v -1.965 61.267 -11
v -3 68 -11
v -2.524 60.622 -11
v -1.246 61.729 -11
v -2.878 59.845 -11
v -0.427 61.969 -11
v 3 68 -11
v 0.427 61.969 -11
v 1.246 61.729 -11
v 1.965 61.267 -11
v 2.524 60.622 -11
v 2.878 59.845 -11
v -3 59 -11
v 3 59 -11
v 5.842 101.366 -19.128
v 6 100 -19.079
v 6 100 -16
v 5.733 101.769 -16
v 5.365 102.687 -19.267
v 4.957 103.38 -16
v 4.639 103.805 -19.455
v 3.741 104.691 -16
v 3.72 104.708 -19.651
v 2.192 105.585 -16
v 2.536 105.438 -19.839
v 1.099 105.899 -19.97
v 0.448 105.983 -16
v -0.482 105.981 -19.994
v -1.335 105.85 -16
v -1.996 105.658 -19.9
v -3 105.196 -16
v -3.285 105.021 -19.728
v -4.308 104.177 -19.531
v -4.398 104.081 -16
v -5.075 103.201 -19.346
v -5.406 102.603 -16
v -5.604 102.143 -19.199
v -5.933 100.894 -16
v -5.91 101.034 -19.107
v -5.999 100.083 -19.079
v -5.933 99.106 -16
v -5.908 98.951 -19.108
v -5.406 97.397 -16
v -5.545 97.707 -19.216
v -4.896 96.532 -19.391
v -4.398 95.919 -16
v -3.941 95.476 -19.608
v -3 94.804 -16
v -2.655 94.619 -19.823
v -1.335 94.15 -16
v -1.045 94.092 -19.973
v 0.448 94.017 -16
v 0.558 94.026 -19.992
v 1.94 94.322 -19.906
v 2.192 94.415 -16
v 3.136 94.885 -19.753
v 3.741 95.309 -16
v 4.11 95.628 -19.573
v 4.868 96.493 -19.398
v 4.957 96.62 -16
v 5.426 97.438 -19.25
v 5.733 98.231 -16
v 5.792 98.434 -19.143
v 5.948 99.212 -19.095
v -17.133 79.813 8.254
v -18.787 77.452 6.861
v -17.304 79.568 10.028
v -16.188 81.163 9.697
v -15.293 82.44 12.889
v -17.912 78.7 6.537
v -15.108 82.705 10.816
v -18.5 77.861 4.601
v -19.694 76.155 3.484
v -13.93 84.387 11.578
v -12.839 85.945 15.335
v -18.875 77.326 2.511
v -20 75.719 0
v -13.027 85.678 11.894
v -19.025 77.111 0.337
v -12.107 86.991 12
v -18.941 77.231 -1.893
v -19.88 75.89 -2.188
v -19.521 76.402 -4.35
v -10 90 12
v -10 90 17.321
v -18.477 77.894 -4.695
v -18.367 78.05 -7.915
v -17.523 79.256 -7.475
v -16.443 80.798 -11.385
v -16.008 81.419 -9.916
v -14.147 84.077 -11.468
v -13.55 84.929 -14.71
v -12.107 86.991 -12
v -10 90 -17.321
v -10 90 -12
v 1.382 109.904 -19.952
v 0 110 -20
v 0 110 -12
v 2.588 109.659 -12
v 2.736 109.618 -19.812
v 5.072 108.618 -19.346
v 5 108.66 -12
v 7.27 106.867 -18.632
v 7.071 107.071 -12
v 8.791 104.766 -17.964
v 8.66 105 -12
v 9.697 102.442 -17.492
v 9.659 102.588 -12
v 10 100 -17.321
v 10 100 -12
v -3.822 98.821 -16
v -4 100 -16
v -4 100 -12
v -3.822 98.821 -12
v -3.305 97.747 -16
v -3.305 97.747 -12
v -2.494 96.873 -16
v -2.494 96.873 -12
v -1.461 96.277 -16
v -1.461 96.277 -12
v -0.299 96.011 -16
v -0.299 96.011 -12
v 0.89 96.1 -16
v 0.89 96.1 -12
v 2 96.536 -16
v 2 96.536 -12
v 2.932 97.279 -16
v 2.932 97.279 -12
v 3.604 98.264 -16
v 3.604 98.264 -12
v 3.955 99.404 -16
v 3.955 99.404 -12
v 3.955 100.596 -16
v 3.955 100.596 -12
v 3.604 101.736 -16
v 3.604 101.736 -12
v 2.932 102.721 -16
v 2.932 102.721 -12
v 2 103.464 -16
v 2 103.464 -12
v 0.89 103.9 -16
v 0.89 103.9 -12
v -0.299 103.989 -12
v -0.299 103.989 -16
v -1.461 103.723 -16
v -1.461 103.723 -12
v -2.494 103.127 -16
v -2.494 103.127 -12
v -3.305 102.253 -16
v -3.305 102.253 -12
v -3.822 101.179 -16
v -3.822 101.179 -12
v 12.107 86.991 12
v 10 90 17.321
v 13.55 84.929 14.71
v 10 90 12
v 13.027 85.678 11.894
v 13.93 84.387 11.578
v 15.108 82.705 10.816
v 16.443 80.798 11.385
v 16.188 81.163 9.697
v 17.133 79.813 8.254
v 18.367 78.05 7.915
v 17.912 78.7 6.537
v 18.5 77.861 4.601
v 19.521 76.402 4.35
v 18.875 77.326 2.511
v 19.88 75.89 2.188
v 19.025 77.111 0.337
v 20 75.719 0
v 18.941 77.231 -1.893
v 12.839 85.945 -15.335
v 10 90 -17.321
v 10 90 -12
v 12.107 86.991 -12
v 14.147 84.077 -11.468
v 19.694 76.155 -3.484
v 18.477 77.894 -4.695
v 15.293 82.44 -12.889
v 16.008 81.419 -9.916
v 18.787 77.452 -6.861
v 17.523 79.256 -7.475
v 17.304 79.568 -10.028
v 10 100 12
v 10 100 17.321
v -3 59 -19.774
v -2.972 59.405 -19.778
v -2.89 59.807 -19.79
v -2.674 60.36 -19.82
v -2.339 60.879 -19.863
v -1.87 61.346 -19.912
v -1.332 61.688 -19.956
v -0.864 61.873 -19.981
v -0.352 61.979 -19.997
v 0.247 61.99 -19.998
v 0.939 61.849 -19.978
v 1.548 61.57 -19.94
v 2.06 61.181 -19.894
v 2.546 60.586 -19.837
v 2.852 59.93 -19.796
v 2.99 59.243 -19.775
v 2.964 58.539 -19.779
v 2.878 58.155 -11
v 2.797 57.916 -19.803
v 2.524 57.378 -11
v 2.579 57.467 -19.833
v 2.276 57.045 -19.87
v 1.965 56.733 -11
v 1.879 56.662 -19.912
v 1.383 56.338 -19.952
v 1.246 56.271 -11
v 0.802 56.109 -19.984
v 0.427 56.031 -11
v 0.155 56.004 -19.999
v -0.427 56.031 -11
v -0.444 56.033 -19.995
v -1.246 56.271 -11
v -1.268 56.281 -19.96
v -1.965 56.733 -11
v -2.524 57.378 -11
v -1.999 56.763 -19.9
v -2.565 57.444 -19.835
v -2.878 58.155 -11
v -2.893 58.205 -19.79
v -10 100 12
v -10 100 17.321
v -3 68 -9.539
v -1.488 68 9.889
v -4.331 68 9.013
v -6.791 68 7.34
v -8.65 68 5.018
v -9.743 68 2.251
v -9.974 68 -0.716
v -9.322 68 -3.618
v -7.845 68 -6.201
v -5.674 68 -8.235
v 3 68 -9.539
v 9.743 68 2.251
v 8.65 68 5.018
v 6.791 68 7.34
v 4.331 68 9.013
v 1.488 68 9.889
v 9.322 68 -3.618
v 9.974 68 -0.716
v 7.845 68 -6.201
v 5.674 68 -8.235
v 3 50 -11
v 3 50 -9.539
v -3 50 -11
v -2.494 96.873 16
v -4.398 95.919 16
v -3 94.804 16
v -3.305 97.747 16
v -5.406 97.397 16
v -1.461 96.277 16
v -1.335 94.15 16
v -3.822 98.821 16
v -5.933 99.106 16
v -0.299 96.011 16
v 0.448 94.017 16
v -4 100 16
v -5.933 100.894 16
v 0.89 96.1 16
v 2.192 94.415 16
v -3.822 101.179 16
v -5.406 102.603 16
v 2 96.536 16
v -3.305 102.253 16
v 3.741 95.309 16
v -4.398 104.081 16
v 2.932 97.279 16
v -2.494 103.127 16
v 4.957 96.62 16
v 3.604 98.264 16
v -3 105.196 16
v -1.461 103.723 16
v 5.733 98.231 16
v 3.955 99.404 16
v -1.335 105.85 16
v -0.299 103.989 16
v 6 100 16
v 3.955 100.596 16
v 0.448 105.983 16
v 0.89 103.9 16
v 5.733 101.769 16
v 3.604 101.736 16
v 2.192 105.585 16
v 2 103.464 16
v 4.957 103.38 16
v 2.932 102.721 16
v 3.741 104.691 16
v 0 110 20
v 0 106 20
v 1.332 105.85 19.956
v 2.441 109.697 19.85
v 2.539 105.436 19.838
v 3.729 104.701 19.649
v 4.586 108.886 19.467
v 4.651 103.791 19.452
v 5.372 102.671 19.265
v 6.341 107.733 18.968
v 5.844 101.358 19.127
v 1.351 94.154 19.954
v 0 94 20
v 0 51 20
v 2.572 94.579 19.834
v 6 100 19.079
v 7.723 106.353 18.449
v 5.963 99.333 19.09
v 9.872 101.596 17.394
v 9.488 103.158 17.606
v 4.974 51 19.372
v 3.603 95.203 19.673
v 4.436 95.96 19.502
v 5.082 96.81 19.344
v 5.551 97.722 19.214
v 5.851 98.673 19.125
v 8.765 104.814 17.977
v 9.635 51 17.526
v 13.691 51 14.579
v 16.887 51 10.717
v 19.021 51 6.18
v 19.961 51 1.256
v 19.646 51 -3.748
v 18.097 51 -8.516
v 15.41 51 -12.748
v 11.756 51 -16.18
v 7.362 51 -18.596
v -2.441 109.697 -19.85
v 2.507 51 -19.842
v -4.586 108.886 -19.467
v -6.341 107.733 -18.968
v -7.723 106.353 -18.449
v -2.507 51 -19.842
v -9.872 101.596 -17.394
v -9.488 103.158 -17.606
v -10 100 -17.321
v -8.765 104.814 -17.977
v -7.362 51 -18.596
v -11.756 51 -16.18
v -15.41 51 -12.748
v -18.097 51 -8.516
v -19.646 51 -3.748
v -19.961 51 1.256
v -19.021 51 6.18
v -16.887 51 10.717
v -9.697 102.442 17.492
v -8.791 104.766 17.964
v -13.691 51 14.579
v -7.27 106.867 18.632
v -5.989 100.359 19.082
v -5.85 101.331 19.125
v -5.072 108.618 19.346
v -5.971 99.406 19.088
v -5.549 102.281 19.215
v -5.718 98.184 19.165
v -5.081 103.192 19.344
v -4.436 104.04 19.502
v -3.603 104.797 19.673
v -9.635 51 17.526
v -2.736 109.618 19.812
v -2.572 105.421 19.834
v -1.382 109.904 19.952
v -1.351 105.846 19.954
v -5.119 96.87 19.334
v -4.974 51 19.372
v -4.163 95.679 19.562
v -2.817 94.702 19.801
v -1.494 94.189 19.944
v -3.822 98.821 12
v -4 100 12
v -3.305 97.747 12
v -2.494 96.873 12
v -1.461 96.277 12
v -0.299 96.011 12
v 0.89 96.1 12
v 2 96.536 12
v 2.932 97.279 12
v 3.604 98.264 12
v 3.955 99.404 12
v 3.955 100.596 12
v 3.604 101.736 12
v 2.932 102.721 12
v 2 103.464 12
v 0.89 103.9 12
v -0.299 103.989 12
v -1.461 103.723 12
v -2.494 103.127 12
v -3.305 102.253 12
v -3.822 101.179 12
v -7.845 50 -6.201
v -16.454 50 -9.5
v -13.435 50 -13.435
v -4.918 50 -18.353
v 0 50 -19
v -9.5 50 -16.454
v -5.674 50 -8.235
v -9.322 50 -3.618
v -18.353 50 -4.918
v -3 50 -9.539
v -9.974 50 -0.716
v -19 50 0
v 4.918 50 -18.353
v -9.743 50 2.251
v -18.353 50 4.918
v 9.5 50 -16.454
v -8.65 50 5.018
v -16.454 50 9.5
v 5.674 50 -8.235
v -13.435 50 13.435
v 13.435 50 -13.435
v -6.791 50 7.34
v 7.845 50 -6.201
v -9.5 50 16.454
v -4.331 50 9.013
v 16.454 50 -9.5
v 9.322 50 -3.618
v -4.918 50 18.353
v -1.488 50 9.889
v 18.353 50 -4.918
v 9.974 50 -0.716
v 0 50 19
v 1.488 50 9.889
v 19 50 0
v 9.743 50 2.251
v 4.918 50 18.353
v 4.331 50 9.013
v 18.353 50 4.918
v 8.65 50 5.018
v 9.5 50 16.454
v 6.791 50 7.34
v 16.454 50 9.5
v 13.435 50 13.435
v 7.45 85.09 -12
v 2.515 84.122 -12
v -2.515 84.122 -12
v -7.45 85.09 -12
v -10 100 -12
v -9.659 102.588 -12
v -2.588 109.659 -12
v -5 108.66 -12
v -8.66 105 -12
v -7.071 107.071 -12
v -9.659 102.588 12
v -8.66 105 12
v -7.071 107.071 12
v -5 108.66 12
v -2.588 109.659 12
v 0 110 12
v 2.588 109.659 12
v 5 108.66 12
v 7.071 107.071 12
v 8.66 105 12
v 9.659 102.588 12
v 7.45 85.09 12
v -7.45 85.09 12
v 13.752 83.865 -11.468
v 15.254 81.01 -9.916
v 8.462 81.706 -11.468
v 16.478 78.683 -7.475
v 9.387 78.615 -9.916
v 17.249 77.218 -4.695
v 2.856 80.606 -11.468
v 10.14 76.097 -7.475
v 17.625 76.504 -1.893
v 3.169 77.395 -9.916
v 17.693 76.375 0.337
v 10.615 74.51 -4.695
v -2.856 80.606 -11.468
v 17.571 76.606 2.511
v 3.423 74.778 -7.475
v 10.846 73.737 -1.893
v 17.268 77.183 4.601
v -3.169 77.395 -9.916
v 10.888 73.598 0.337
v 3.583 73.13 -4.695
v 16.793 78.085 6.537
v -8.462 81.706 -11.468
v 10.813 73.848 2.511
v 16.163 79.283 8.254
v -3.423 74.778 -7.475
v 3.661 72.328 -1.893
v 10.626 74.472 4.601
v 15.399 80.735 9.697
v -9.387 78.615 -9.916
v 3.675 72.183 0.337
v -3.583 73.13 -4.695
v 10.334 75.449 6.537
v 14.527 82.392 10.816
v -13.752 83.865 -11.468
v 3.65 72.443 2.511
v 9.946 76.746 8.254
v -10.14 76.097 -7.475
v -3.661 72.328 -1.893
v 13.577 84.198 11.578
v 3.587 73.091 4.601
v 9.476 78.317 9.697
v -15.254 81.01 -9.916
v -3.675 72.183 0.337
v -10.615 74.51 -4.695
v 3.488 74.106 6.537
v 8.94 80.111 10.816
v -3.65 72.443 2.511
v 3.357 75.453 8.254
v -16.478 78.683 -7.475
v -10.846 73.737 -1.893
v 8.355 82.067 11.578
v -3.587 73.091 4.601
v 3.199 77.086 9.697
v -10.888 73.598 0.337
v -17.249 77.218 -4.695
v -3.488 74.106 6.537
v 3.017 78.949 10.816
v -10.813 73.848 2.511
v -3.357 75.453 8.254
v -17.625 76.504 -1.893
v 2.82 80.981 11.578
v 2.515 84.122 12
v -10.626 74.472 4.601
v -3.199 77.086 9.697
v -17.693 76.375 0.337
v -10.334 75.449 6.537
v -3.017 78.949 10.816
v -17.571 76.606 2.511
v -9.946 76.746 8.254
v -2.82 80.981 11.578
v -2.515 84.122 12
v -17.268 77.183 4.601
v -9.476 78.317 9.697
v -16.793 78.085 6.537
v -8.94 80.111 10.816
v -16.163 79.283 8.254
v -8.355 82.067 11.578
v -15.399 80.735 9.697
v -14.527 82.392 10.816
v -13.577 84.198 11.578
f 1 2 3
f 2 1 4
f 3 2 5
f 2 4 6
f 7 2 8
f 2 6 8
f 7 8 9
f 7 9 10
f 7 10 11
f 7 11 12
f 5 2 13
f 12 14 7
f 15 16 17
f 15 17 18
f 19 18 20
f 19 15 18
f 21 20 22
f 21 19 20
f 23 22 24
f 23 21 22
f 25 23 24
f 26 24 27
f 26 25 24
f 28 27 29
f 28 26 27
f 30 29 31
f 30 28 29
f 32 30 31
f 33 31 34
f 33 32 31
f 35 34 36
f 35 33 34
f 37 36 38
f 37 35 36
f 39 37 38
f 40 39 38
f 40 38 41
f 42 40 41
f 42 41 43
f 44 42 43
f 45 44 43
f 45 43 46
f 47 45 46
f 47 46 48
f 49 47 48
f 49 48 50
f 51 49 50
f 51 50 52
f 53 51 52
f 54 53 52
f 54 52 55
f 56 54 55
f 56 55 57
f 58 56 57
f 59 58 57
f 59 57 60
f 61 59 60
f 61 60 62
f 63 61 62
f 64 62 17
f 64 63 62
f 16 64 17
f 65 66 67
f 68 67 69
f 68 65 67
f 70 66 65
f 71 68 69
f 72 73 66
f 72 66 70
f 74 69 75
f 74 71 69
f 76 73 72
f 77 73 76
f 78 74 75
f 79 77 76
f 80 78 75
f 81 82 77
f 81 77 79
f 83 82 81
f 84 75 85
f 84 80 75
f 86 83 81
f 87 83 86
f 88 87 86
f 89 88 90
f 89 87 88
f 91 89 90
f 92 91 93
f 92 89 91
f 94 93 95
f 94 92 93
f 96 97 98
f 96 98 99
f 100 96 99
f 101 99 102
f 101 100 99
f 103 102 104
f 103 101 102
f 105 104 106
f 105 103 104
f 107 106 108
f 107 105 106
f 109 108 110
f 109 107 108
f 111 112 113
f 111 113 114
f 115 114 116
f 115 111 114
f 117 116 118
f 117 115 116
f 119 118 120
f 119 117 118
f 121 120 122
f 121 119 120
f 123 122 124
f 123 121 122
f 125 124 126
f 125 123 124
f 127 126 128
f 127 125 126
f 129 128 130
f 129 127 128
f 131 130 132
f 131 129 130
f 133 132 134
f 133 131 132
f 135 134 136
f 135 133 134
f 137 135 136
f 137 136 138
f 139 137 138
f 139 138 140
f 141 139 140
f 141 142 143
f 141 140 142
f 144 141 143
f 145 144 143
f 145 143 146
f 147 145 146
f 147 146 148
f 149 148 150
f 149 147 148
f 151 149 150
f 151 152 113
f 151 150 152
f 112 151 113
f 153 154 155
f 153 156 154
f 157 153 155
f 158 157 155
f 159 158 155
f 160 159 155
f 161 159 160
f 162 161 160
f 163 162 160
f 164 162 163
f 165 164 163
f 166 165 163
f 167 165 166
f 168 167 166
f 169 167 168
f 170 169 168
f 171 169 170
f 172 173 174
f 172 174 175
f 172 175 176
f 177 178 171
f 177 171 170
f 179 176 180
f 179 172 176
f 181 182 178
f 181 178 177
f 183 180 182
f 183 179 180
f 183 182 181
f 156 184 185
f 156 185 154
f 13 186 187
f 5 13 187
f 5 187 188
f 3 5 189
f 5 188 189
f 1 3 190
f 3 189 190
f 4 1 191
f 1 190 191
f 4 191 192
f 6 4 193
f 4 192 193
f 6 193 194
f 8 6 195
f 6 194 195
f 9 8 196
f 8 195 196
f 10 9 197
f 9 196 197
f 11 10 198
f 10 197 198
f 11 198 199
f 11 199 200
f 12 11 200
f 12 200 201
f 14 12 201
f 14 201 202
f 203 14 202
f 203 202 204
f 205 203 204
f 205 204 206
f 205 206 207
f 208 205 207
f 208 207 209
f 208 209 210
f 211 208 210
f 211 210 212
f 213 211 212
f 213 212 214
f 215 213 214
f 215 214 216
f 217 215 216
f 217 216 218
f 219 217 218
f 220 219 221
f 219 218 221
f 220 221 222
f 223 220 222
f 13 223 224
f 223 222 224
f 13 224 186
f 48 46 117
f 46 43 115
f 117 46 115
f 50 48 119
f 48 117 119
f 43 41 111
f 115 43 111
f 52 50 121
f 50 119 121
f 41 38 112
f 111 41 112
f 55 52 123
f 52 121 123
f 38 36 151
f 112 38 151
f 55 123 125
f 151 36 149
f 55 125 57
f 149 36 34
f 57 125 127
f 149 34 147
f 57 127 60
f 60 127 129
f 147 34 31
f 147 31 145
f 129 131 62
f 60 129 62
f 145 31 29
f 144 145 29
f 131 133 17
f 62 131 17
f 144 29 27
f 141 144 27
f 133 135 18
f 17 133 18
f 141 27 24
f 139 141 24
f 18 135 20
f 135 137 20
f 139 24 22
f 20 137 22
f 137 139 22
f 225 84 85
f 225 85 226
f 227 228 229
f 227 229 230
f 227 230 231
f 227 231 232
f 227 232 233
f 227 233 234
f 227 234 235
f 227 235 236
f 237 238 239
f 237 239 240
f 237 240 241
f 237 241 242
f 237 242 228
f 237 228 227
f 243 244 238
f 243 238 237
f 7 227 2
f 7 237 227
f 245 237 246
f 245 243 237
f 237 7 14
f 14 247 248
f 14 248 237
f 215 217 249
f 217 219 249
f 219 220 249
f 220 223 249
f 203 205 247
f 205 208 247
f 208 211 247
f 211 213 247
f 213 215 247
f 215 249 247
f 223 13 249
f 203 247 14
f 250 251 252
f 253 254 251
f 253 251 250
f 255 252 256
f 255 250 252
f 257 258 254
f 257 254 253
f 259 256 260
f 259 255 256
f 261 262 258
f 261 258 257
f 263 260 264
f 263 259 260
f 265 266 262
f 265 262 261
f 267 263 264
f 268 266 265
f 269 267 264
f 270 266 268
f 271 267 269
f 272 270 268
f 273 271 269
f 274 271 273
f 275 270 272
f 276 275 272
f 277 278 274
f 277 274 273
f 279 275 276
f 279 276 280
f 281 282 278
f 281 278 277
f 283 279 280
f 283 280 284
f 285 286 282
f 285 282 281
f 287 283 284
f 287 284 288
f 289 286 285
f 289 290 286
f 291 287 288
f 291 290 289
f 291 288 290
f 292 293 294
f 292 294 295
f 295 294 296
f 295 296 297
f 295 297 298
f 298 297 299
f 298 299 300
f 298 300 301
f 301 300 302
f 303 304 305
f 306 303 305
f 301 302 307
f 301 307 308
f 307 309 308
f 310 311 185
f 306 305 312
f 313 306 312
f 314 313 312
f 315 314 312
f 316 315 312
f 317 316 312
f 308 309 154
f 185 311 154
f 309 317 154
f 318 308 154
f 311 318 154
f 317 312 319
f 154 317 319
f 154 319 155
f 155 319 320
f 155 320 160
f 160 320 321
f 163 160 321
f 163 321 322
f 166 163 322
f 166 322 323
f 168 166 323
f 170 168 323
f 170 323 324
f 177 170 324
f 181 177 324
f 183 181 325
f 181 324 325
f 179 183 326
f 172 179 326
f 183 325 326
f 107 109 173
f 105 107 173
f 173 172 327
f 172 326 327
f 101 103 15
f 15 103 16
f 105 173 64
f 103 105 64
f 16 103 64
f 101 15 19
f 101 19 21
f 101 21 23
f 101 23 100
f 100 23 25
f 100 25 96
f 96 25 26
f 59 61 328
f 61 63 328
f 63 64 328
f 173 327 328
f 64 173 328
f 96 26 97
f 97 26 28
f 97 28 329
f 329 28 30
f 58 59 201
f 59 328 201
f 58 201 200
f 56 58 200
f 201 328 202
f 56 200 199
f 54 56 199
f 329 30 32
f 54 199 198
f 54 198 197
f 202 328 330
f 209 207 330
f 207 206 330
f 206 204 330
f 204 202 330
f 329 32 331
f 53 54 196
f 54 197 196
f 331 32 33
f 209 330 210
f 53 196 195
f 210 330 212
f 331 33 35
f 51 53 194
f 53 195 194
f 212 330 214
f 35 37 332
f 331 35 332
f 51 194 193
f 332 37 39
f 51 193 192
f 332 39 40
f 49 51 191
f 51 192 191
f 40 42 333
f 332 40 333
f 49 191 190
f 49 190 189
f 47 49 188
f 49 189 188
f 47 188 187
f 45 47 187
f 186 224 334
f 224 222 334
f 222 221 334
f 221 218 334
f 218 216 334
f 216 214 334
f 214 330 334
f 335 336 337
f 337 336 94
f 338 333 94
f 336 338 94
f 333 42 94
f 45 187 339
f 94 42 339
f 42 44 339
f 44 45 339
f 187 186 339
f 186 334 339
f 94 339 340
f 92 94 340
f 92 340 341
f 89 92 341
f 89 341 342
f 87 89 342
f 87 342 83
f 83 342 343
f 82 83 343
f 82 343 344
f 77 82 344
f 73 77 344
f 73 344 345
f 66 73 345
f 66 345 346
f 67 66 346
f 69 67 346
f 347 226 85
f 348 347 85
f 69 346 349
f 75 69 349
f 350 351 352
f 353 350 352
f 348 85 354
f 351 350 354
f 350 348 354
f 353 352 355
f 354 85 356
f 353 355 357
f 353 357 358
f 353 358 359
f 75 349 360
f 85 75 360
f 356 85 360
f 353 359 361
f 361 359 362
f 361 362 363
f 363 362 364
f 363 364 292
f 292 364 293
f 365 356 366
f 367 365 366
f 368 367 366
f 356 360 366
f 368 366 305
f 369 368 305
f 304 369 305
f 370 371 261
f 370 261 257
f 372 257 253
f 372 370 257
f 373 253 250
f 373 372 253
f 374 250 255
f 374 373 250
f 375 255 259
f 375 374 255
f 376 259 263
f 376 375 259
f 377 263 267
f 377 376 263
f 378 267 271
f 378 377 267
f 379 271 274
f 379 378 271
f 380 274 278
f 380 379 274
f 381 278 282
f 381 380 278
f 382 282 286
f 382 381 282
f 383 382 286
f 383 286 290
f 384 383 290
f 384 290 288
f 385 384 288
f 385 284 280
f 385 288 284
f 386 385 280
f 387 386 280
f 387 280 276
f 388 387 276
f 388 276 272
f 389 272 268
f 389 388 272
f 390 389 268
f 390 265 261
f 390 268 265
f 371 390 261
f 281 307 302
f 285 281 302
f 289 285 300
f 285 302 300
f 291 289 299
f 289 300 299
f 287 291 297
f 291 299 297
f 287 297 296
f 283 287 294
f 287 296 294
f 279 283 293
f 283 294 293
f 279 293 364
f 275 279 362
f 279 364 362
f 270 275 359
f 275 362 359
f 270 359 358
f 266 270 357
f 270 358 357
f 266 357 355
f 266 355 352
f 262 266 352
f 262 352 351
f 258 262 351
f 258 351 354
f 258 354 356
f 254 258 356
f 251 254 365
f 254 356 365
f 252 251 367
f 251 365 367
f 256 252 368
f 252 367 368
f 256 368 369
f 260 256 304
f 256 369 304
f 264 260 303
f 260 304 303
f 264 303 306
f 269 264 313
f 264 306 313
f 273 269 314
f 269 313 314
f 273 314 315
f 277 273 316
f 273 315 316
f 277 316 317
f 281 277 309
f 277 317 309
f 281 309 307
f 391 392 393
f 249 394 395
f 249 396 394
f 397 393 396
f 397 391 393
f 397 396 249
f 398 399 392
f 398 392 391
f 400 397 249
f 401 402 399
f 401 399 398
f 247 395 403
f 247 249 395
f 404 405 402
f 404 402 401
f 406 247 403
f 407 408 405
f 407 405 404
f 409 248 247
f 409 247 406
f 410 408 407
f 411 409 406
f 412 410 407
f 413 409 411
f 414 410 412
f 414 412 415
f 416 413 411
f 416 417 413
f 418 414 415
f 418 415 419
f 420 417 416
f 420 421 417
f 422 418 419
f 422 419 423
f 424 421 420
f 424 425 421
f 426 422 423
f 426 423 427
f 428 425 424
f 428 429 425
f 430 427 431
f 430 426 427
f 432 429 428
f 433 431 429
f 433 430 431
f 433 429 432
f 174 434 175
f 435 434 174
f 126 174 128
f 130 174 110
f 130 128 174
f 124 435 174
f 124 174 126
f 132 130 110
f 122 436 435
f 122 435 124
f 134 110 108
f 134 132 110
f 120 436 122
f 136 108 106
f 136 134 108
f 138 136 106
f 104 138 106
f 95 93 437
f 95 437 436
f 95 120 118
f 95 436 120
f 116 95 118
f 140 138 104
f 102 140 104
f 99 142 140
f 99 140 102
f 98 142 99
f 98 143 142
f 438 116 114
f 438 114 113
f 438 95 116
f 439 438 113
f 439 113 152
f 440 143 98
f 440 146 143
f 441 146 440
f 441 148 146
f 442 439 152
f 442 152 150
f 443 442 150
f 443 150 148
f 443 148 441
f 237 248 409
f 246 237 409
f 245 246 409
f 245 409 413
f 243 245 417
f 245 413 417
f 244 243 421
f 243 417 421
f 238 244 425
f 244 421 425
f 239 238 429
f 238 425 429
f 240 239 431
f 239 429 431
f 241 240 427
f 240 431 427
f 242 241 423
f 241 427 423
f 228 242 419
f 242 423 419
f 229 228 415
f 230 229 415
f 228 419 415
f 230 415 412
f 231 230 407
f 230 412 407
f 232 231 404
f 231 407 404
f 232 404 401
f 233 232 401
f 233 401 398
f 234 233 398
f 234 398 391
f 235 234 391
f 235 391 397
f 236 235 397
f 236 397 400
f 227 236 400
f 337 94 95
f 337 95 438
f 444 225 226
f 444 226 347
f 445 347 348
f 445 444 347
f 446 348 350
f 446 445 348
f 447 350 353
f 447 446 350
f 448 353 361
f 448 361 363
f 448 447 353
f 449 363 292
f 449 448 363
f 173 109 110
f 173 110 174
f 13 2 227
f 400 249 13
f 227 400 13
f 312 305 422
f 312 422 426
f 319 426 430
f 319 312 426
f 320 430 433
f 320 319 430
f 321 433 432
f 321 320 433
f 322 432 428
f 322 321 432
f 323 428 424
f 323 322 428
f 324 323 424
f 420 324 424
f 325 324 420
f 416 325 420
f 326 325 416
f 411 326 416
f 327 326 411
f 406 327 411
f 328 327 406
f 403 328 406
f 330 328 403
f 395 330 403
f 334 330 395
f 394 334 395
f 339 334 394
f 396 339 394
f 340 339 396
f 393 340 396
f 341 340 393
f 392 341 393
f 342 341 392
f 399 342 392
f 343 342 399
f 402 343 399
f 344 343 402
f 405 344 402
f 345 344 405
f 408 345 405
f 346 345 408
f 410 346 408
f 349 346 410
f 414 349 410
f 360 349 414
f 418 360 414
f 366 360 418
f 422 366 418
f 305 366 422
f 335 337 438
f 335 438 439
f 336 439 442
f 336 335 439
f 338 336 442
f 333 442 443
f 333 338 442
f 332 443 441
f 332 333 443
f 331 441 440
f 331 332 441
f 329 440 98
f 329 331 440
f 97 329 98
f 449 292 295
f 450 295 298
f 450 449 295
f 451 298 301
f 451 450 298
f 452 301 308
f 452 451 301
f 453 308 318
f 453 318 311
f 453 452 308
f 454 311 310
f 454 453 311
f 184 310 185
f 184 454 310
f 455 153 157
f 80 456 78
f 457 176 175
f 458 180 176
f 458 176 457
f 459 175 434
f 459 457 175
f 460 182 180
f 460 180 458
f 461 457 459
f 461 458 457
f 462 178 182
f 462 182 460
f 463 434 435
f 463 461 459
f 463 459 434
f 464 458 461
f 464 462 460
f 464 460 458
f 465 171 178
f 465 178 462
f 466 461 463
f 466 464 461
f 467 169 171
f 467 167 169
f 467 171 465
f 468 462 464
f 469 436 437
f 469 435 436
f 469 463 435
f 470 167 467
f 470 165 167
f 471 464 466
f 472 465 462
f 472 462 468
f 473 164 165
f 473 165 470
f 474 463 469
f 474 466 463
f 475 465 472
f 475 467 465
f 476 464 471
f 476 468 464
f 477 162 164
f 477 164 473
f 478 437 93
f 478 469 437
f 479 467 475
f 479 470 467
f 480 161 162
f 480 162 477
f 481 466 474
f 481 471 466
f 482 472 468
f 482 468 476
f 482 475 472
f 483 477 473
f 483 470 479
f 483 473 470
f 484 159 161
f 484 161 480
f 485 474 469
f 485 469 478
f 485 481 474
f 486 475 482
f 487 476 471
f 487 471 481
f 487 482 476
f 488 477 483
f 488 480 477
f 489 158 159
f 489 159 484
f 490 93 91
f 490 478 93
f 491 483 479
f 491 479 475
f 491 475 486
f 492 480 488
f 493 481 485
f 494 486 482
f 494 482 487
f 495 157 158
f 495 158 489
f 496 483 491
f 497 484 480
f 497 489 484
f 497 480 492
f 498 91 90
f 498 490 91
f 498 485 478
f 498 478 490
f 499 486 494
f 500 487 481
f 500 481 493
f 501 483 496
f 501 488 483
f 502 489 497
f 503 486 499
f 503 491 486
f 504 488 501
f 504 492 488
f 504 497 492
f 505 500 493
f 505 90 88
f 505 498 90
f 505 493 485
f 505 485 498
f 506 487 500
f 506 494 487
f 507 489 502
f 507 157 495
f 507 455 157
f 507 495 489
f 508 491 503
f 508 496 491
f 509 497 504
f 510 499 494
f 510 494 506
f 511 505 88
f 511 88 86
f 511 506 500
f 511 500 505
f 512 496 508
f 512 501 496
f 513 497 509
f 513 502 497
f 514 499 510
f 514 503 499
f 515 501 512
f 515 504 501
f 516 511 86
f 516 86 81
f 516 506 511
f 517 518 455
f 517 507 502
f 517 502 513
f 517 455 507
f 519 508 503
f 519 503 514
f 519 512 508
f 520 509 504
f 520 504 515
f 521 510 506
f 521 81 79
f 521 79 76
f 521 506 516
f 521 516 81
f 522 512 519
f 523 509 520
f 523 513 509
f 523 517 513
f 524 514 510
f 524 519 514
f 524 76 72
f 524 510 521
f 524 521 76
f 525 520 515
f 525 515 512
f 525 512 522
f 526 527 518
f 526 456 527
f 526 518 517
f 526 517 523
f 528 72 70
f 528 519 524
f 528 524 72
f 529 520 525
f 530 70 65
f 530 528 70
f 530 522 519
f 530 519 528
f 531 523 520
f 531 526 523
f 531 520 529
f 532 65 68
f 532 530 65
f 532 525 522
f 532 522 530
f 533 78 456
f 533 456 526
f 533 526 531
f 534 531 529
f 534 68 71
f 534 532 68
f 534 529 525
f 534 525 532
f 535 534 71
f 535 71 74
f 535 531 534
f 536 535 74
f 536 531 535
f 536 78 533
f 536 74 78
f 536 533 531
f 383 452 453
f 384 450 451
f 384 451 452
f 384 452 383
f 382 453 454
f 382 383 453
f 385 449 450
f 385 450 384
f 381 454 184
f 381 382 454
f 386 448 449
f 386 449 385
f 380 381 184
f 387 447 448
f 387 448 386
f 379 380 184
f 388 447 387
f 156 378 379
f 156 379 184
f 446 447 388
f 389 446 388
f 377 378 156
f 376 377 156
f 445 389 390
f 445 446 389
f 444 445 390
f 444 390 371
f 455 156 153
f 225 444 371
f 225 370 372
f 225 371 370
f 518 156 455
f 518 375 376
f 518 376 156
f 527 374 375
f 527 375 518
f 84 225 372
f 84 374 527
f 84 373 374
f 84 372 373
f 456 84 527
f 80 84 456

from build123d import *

# Parameters (mm, degrees)
CROQUIS1_R                 = 20
SALIENTE_EXTRUIR1_DEPTH    = 110
CORTAR_EXTRUIR1_DEPTH      = 110
CORTAR_EXTRUIR1_DEPTH_BACK = 110
CORTAR_EXTRUIR2_DEPTH      = 110
CORTAR_EXTRUIR2_DEPTH_BACK = 110
CROQUIS4_R                 = 4
CROQUIS5_R                 = 6
CORTAR_EXTRUIR4_DEPTH      = 4
CORTAR_EXTRUIR5_DEPTH      = 30
CORTAR_EXTRUIR5_DEPTH_BACK = 40
CROQUIS10_W                = 40
CROQUIS10_H                = 50
SALIENTE_EXTRUIR2_START    = 20
CROQUIS11_R                = 14
SALIENTE_EXTRUIR2_DEPTH    = 20
CROQUIS12_R                = 10
CORTAR_EXTRUIR6_DEPTH      = 18
CROQUIS14_W                = 6
CROQUIS14_H                = 2
CORTAR_EXTRUIR7_DEPTH      = 18
CROQUIS16_R                = 3
CORTAR_EXTRUIR8_DEPTH      = 9
CHAFL_N1_SIZE              = 1


with BuildPart() as part:
    # Croquis1 → Saliente-Extruir1 (new body)
    with BuildSketch(Plane(origin=(0, 0, 0), x_dir=(1, 0, 0), z_dir=(0, 1, 0))):
        with Locations(Location((0, 0, 0), (0, 0, 270))):
            Circle(CROQUIS1_R)
    extrude(amount=SALIENTE_EXTRUIR1_DEPTH)

    # Croquis2 → Cortar-Extruir1 (cut, two sides: drawn at the far end of the back side and taken through both)
    with BuildSketch(Plane.XY.offset(-CORTAR_EXTRUIR1_DEPTH_BACK)):
        with BuildLine():
            Line((-10, 90), (-10, 100))
            ThreePointArc((-10, 100), (-7.071067812, 107.071067812), (0, 110))
            Line((0, 110), (-20, 110))
            Line((-20, 110), (-20, 75.718519933))
            Line((-20, 75.718519933), (-10, 90))
        make_face()
        with BuildLine():
            Line((20, 110), (0, 110))
            ThreePointArc((0, 110), (7.071067812, 107.071067812), (10, 100))
            Line((10, 100), (10, 90))
            Line((10, 90), (20, 75.718519933))
            Line((20, 75.718519933), (20, 110))
        make_face()
    extrude(amount=CORTAR_EXTRUIR1_DEPTH + CORTAR_EXTRUIR1_DEPTH_BACK, mode=Mode.SUBTRACT)

    # Croquis4 → Cortar-Extruir2 (cut, two sides: drawn at the far end of the back side and taken through both)
    with BuildSketch(Plane.XY.offset(-CORTAR_EXTRUIR2_DEPTH_BACK)):
        with Locations(Location((0, 100, 0), (0, 0, 180))):
            Circle(CROQUIS4_R)
    extrude(amount=CORTAR_EXTRUIR2_DEPTH + CORTAR_EXTRUIR2_DEPTH_BACK, mode=Mode.SUBTRACT)

    # Croquis3 → Cortar-Revolución1 (revolve, cut)
    with BuildSketch(Plane(origin=(0, 0, 0), x_dir=(0, 0, -1), z_dir=(1, 0, 0))):
        with BuildLine():
            Line((-12, 110), (12, 110))
            Line((12, 110), (12, 84))
            ThreePointArc((12, 84), (0, 72), (-12, 84))
            Line((-12, 84), (-12, 110))
        make_face()
    revolve(axis=Axis((0, 110, 12), (0, 0, -1)), mode=Mode.SUBTRACT)

    # Croquis5 → Cortar-Extruir4 (cut)
    with BuildSketch(Plane.XY.offset(20)):
        with Locations((0, 100)):
            Circle(CROQUIS5_R)
    cortar_extruir4 = extrude(amount=-CORTAR_EXTRUIR4_DEPTH, mode=Mode.SUBTRACT)

    # Simetría1: Cortar-Extruir4 across plane
    add(cortar_extruir4.mirror(Plane.XY), mode=Mode.SUBTRACT)

    # Croquis6 → Cortar-Revolución2 (revolve, cut)
    with BuildSketch(Plane.XY, mode=Mode.PRIVATE) as cortar_revoluci_n2_sk:
        Polygon((-9, 0), (0, 0), (0, 70), (-14, 70), (-14, 30), (-9, 30), align=None)
    revolve(cortar_revoluci_n2_sk.sketch.rotate(Axis((0, 70, 0), (0, -1, 0)), 270), axis=Axis((0, 70, 0), (0, -1, 0)), mode=Mode.SUBTRACT)

    # Croquis10 → Cortar-Extruir5 (cut, two sides: drawn at the far end of the back side and taken through both)
    with BuildSketch(Plane.XY.offset(-CORTAR_EXTRUIR5_DEPTH_BACK)):
        with Locations((0, 25)):
            Rectangle(CROQUIS10_W, CROQUIS10_H)
    extrude(amount=CORTAR_EXTRUIR5_DEPTH + CORTAR_EXTRUIR5_DEPTH_BACK, mode=Mode.SUBTRACT)

    # Croquis11 → Saliente-Extruir2 (add)
    with BuildSketch(Plane.XZ.offset(-70).offset(SALIENTE_EXTRUIR2_START)):
        Circle(CROQUIS11_R)
    extrude(amount=-SALIENTE_EXTRUIR2_DEPTH)

    # Croquis12 → Cortar-Extruir6 (cut)
    with BuildSketch(Plane.XZ.offset(-50)):
        with Locations(Location((0, 0, 0), (0, 0, 270))):
            Circle(CROQUIS12_R)
    extrude(amount=-CORTAR_EXTRUIR6_DEPTH, mode=Mode.SUBTRACT)

    # Croquis14 → Cortar-Extruir7 (cut)
    with BuildSketch(Plane.XZ.offset(-50)):
        with Locations((0, -10)):
            Rectangle(CROQUIS14_W, CROQUIS14_H)
    extrude(amount=-CORTAR_EXTRUIR7_DEPTH, mode=Mode.SUBTRACT)

    # Croquis16 → Cortar-Extruir8 (cut)
    with BuildSketch(Plane(origin=(0, 0, -20), x_dir=(-1, 0, 0), z_dir=(0, 0, -1))):
        with Locations((0, 59)):
            Circle(CROQUIS16_R)
    extrude(amount=-CORTAR_EXTRUIR8_DEPTH, mode=Mode.SUBTRACT)

    # Chaflán1
    chafl_n1_edges = [part.edges().sort_by_distance(p)[0] for p in [
        (0, 50, -20),
    ]]
    chamfer(chafl_n1_edges, length=CHAFL_N1_SIZE)


solid = part.part
